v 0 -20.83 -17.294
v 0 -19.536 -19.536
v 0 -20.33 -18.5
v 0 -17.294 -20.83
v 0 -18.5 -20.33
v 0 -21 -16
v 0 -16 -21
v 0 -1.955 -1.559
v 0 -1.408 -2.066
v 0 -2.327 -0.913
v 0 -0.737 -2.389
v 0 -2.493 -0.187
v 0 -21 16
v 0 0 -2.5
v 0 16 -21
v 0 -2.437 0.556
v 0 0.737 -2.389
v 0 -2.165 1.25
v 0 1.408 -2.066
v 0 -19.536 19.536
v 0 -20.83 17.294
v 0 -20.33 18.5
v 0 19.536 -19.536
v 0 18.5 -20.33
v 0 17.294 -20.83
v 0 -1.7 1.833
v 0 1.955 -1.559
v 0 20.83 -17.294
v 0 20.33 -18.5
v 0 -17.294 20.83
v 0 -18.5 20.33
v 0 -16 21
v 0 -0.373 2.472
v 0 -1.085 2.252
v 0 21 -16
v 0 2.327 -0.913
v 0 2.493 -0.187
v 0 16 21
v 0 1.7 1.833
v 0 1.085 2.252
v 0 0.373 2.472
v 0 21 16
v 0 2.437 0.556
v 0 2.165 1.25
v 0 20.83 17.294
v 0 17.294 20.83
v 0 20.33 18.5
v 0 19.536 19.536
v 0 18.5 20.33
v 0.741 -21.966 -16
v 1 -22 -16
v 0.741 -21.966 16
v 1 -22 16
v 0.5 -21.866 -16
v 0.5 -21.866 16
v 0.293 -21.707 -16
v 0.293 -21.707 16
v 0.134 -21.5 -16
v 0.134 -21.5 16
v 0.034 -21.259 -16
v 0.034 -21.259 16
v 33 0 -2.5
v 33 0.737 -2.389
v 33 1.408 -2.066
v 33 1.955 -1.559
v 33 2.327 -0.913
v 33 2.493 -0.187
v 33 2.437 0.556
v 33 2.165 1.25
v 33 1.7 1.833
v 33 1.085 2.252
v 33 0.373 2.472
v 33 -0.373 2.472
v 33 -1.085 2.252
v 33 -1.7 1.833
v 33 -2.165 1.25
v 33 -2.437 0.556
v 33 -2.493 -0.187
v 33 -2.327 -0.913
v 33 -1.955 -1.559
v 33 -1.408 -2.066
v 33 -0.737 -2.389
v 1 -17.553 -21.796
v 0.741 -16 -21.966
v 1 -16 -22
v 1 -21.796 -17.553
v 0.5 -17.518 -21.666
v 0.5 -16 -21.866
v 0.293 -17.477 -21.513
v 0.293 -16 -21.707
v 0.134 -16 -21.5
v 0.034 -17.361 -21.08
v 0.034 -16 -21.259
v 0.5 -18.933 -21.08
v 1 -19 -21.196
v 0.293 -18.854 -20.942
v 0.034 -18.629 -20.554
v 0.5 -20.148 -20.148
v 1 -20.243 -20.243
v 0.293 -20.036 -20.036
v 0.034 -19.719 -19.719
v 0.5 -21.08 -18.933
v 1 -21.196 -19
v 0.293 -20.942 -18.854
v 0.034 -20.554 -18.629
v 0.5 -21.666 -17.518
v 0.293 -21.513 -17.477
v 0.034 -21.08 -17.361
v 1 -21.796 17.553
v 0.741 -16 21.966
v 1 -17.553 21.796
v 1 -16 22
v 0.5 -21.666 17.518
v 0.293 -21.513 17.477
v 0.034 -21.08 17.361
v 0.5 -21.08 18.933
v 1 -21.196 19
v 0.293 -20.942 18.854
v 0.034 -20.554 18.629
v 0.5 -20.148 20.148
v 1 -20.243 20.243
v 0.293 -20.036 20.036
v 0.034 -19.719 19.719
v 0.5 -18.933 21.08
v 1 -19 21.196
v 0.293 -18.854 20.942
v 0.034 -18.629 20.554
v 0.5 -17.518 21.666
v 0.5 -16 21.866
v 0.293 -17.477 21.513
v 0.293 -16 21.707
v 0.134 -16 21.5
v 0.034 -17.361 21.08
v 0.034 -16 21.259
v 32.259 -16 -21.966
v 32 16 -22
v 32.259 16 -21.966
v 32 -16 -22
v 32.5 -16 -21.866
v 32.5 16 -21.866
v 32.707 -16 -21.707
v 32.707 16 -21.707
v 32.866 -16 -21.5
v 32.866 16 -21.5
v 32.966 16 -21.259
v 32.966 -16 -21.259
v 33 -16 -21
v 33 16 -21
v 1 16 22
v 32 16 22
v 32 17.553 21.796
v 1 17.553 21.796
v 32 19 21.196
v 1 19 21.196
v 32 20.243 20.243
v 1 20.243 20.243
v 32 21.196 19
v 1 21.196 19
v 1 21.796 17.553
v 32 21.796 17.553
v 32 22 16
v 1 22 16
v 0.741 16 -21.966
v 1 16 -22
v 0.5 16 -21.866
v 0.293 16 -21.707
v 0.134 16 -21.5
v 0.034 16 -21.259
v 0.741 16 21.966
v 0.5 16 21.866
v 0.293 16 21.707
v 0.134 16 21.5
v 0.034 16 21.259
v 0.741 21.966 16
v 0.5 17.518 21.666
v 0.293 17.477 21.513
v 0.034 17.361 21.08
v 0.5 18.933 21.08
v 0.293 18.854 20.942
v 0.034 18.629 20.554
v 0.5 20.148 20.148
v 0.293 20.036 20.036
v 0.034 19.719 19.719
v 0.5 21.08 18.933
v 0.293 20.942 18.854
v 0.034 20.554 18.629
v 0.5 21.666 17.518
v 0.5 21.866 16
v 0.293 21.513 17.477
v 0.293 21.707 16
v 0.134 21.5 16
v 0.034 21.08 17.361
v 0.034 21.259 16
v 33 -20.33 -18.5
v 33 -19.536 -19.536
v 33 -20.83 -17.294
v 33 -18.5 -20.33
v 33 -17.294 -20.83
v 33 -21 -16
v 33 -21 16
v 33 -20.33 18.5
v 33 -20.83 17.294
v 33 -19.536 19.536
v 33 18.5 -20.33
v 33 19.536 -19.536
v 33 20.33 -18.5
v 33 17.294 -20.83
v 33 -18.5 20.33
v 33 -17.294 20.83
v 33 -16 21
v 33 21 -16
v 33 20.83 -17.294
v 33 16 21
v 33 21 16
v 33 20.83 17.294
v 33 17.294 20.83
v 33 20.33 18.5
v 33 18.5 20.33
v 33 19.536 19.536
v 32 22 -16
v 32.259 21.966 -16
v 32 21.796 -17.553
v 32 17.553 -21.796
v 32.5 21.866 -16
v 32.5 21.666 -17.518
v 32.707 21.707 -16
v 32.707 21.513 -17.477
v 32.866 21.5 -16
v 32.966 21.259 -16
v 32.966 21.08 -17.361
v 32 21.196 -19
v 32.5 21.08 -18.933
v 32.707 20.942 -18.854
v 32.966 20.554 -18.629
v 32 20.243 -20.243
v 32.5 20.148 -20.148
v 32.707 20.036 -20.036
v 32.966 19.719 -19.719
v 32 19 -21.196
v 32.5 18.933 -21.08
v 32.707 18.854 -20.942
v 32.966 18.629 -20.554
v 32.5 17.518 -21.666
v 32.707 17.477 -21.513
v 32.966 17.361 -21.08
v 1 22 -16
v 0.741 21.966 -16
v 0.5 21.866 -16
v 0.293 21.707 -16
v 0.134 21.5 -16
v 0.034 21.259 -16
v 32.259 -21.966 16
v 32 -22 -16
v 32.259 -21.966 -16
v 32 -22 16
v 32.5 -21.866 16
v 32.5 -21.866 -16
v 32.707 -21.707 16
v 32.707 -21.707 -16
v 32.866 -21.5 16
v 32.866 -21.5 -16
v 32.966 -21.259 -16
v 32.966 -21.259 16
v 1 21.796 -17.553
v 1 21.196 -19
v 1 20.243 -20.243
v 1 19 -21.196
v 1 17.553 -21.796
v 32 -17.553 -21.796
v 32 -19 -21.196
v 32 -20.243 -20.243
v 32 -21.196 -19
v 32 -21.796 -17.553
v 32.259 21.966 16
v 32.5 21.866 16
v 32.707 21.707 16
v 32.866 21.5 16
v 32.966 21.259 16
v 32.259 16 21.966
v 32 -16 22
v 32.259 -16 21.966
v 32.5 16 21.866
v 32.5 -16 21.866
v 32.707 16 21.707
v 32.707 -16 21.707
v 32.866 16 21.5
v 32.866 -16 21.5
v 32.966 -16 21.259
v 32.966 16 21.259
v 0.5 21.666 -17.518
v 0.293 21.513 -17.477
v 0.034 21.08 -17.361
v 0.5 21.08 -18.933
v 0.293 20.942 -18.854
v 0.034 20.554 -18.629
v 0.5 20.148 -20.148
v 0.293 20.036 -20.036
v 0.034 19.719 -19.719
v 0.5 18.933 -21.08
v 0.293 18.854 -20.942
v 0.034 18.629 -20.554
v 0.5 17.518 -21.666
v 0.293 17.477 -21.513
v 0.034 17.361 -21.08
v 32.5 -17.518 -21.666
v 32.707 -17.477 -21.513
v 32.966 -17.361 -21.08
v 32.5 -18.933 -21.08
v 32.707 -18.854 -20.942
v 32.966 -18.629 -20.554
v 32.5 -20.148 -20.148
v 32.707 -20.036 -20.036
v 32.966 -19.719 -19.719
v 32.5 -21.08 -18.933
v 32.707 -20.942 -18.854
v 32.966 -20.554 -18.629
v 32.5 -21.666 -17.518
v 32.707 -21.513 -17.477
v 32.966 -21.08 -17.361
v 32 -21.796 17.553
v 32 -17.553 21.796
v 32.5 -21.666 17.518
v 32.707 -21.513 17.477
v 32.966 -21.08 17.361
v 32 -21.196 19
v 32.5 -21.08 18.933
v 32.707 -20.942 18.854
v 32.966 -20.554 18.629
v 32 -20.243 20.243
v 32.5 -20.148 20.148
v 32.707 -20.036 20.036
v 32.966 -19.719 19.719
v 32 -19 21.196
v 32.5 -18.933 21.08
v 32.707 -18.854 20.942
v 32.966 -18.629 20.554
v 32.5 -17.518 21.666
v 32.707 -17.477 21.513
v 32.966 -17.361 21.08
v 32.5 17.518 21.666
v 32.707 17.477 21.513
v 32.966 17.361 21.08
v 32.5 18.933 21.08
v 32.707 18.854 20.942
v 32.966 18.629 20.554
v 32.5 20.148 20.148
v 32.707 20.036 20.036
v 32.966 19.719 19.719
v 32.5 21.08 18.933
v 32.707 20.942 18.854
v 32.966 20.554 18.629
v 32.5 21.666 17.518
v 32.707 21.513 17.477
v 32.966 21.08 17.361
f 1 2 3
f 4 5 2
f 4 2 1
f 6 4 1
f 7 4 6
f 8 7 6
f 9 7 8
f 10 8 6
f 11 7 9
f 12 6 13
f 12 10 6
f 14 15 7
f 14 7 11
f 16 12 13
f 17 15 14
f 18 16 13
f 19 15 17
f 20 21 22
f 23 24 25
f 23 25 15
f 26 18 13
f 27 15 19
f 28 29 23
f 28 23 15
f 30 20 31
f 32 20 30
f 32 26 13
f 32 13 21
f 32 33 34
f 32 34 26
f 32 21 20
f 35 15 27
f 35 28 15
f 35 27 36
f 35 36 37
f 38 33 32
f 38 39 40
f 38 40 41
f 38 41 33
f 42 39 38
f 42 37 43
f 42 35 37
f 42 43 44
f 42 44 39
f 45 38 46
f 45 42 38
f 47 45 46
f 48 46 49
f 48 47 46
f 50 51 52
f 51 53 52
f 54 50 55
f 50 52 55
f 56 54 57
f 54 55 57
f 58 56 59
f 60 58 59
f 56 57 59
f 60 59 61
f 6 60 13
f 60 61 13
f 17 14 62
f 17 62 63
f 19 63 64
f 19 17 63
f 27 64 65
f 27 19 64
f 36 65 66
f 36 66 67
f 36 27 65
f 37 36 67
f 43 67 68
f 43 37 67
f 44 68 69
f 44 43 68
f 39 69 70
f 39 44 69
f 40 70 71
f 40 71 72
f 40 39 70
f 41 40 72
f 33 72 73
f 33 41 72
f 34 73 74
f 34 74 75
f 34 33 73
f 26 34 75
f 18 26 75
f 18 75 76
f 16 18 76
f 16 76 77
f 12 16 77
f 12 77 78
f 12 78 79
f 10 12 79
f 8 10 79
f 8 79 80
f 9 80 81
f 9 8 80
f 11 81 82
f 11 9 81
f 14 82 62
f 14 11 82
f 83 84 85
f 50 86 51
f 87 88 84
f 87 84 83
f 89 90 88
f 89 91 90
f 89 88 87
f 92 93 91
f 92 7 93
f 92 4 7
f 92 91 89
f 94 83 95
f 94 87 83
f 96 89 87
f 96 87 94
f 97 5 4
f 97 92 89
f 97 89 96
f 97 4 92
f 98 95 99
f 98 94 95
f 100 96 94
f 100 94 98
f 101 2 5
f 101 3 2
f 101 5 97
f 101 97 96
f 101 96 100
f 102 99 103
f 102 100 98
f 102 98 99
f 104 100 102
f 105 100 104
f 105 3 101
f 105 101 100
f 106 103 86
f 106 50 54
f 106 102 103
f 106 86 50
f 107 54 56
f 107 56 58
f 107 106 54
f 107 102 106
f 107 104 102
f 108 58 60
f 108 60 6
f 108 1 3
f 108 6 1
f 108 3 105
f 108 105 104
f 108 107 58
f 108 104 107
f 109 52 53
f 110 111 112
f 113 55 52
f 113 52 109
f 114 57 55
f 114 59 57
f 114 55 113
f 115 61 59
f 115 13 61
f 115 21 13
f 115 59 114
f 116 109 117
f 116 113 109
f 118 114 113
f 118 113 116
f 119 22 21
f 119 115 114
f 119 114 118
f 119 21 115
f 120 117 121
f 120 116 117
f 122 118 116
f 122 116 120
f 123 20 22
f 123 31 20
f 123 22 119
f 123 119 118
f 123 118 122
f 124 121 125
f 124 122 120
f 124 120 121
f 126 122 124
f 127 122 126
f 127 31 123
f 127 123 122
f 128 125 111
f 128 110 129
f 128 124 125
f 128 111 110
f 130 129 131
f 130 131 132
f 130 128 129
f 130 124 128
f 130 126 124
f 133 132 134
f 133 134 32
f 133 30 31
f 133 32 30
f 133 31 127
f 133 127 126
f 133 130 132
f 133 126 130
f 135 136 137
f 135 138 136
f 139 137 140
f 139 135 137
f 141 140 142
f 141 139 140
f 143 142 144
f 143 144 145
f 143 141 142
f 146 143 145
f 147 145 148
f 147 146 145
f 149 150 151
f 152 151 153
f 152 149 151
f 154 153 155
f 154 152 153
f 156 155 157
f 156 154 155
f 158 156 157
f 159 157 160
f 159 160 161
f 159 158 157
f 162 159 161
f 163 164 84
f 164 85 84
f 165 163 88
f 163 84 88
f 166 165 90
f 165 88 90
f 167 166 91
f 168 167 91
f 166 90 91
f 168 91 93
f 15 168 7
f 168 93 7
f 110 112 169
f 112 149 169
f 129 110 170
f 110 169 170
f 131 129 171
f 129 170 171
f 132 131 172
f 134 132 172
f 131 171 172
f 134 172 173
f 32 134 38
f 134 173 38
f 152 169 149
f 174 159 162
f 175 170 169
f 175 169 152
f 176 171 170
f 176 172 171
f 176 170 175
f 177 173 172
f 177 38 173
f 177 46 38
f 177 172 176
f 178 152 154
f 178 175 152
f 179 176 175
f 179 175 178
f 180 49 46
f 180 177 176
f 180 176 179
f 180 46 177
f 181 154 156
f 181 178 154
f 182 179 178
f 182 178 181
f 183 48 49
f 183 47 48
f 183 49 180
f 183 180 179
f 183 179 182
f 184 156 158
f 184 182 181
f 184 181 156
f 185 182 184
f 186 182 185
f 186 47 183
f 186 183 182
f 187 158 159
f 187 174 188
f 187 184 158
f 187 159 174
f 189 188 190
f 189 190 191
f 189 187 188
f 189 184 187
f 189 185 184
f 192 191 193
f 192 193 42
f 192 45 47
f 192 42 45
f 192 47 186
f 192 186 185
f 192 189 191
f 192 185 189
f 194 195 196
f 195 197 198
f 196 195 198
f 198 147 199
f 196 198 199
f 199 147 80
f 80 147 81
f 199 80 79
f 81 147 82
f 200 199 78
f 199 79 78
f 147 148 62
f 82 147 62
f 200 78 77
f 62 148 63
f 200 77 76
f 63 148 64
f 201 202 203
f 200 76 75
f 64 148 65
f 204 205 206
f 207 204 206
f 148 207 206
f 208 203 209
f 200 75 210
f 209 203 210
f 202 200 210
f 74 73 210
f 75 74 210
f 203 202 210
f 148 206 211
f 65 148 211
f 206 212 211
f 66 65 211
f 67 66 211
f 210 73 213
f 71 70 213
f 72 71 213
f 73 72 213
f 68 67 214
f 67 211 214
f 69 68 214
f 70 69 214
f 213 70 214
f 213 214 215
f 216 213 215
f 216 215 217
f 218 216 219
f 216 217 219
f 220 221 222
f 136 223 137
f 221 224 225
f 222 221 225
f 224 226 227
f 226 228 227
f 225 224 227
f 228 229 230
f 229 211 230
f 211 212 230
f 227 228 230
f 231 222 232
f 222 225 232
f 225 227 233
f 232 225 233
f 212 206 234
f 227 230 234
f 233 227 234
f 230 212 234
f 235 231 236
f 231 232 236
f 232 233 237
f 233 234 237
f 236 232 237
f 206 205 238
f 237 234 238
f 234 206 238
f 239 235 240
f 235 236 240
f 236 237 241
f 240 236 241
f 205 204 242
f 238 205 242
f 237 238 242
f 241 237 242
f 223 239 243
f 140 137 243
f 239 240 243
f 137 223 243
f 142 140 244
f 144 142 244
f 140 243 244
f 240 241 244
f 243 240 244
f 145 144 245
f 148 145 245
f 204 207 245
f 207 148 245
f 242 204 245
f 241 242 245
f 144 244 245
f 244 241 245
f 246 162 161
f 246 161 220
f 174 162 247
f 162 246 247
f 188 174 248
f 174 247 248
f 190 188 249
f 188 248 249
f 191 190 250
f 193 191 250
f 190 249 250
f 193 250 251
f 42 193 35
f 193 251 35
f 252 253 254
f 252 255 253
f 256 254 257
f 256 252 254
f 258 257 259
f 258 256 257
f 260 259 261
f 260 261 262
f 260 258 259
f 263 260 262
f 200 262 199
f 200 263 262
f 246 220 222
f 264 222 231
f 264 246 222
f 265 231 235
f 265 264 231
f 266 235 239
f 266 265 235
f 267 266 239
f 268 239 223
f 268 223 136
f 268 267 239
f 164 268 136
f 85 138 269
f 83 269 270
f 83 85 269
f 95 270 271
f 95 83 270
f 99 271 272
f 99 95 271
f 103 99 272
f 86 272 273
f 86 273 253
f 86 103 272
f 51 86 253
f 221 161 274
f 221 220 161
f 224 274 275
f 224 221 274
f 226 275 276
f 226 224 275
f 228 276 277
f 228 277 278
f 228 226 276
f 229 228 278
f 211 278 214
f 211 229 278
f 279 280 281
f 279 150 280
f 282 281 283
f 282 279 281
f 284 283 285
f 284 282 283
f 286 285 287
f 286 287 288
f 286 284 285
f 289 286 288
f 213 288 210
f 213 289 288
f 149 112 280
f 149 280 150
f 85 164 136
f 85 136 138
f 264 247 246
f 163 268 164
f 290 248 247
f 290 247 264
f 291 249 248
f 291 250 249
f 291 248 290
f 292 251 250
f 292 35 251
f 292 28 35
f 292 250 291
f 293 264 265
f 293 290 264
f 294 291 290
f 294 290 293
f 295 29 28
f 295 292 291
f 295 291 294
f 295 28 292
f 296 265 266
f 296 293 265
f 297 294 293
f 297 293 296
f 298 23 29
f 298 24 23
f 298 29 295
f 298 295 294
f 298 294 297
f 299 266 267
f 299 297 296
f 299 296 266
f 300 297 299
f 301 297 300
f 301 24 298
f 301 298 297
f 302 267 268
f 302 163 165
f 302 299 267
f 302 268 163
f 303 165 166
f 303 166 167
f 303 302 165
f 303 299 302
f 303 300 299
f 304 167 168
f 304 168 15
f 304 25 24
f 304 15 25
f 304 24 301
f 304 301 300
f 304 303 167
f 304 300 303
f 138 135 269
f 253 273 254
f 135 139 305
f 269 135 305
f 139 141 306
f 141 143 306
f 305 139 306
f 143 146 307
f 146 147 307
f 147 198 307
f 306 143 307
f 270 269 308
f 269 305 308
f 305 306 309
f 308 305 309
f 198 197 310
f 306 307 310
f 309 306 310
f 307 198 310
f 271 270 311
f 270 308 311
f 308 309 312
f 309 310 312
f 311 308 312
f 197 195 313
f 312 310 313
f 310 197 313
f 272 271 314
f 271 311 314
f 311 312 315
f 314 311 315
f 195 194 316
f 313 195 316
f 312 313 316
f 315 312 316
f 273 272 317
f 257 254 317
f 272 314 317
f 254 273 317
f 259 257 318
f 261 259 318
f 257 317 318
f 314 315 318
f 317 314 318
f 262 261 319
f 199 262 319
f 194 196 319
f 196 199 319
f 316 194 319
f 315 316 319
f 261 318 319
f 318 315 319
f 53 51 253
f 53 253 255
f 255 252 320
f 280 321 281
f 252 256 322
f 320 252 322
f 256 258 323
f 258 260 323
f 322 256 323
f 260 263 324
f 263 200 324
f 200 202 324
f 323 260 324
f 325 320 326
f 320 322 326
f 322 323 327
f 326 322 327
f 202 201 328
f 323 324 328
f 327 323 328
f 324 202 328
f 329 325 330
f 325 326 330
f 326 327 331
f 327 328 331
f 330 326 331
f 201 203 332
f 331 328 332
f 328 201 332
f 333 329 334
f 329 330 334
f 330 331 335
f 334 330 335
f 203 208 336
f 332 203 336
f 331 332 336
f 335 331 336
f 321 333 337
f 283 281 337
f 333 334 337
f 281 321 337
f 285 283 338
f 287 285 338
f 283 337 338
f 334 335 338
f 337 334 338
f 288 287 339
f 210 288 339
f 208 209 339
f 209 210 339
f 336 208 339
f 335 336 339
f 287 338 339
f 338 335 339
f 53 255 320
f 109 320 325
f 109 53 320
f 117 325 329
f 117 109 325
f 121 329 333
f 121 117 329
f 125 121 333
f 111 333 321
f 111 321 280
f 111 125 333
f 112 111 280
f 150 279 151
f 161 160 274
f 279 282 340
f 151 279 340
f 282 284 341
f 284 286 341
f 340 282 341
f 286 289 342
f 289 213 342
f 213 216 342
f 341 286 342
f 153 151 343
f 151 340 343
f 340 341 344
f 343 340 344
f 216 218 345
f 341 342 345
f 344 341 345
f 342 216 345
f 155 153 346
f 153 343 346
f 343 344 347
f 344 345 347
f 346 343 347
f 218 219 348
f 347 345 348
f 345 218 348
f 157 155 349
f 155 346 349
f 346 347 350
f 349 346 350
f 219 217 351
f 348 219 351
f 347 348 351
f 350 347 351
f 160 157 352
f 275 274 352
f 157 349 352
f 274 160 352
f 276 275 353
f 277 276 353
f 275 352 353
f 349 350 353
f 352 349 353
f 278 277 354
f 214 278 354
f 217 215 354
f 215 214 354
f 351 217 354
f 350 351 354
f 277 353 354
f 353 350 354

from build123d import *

# Parameters (mm, degrees)
SKETCH1_R           = 2.5
BOSS_EXTRUDE1_DEPTH = 33
FILLET1_R           = 1


with BuildPart() as part:
    # Sketch1 → Boss-Extrude1 (new body)
    with BuildSketch(Plane(origin=(0, 0, 0), x_dir=(0, 0, -1), z_dir=(1, 0, 0))):
        with BuildLine():
            Line((-16, 22), (16, 22))
            ThreePointArc((16, 22), (20.242640687, 20.242640687), (22, 16))
            Line((22, 16), (22, -16))
            ThreePointArc((22, -16), (20.242640687, -20.242640687), (16, -22))
            Line((16, -22), (-16, -22))
            ThreePointArc((-16, -22), (-20.242640687, -20.242640687), (-22, -16))
            Line((-22, -16), (-22, 16))
            ThreePointArc((-22, 16), (-20.242640687, 20.242640687), (-16, 22))
        make_face()
        Circle(SKETCH1_R, mode=Mode.SUBTRACT)
    extrude(amount=BOSS_EXTRUDE1_DEPTH)

    # Fillet1
    fillet1_edges = [part.edges().sort_by_distance(p)[0] for p in [
        (0, 0, -22),
        (0, -20.242640687, -20.242640687),
        (0, -22, 0),
        (0, -20.242640687, 20.242640687),
        (33, -20.242640687, -20.242640687),
        (33, 0, -22),
        (33, 20.242640687, -20.242640687),
        (33, 22, 0),
        (33, 20.242640687, 20.242640687),
        (33, 0, 22),
        (33, -20.242640687, 20.242640687),
        (0, 0, 22),
        (33, -22, 0),
        (0, 20.242640687, 20.242640687),
        (0, 22, 0),
        (0, 20.242640687, -20.242640687),
    ]]
    fillet(fillet1_edges, radius=FILLET1_R)


solid = part.part
